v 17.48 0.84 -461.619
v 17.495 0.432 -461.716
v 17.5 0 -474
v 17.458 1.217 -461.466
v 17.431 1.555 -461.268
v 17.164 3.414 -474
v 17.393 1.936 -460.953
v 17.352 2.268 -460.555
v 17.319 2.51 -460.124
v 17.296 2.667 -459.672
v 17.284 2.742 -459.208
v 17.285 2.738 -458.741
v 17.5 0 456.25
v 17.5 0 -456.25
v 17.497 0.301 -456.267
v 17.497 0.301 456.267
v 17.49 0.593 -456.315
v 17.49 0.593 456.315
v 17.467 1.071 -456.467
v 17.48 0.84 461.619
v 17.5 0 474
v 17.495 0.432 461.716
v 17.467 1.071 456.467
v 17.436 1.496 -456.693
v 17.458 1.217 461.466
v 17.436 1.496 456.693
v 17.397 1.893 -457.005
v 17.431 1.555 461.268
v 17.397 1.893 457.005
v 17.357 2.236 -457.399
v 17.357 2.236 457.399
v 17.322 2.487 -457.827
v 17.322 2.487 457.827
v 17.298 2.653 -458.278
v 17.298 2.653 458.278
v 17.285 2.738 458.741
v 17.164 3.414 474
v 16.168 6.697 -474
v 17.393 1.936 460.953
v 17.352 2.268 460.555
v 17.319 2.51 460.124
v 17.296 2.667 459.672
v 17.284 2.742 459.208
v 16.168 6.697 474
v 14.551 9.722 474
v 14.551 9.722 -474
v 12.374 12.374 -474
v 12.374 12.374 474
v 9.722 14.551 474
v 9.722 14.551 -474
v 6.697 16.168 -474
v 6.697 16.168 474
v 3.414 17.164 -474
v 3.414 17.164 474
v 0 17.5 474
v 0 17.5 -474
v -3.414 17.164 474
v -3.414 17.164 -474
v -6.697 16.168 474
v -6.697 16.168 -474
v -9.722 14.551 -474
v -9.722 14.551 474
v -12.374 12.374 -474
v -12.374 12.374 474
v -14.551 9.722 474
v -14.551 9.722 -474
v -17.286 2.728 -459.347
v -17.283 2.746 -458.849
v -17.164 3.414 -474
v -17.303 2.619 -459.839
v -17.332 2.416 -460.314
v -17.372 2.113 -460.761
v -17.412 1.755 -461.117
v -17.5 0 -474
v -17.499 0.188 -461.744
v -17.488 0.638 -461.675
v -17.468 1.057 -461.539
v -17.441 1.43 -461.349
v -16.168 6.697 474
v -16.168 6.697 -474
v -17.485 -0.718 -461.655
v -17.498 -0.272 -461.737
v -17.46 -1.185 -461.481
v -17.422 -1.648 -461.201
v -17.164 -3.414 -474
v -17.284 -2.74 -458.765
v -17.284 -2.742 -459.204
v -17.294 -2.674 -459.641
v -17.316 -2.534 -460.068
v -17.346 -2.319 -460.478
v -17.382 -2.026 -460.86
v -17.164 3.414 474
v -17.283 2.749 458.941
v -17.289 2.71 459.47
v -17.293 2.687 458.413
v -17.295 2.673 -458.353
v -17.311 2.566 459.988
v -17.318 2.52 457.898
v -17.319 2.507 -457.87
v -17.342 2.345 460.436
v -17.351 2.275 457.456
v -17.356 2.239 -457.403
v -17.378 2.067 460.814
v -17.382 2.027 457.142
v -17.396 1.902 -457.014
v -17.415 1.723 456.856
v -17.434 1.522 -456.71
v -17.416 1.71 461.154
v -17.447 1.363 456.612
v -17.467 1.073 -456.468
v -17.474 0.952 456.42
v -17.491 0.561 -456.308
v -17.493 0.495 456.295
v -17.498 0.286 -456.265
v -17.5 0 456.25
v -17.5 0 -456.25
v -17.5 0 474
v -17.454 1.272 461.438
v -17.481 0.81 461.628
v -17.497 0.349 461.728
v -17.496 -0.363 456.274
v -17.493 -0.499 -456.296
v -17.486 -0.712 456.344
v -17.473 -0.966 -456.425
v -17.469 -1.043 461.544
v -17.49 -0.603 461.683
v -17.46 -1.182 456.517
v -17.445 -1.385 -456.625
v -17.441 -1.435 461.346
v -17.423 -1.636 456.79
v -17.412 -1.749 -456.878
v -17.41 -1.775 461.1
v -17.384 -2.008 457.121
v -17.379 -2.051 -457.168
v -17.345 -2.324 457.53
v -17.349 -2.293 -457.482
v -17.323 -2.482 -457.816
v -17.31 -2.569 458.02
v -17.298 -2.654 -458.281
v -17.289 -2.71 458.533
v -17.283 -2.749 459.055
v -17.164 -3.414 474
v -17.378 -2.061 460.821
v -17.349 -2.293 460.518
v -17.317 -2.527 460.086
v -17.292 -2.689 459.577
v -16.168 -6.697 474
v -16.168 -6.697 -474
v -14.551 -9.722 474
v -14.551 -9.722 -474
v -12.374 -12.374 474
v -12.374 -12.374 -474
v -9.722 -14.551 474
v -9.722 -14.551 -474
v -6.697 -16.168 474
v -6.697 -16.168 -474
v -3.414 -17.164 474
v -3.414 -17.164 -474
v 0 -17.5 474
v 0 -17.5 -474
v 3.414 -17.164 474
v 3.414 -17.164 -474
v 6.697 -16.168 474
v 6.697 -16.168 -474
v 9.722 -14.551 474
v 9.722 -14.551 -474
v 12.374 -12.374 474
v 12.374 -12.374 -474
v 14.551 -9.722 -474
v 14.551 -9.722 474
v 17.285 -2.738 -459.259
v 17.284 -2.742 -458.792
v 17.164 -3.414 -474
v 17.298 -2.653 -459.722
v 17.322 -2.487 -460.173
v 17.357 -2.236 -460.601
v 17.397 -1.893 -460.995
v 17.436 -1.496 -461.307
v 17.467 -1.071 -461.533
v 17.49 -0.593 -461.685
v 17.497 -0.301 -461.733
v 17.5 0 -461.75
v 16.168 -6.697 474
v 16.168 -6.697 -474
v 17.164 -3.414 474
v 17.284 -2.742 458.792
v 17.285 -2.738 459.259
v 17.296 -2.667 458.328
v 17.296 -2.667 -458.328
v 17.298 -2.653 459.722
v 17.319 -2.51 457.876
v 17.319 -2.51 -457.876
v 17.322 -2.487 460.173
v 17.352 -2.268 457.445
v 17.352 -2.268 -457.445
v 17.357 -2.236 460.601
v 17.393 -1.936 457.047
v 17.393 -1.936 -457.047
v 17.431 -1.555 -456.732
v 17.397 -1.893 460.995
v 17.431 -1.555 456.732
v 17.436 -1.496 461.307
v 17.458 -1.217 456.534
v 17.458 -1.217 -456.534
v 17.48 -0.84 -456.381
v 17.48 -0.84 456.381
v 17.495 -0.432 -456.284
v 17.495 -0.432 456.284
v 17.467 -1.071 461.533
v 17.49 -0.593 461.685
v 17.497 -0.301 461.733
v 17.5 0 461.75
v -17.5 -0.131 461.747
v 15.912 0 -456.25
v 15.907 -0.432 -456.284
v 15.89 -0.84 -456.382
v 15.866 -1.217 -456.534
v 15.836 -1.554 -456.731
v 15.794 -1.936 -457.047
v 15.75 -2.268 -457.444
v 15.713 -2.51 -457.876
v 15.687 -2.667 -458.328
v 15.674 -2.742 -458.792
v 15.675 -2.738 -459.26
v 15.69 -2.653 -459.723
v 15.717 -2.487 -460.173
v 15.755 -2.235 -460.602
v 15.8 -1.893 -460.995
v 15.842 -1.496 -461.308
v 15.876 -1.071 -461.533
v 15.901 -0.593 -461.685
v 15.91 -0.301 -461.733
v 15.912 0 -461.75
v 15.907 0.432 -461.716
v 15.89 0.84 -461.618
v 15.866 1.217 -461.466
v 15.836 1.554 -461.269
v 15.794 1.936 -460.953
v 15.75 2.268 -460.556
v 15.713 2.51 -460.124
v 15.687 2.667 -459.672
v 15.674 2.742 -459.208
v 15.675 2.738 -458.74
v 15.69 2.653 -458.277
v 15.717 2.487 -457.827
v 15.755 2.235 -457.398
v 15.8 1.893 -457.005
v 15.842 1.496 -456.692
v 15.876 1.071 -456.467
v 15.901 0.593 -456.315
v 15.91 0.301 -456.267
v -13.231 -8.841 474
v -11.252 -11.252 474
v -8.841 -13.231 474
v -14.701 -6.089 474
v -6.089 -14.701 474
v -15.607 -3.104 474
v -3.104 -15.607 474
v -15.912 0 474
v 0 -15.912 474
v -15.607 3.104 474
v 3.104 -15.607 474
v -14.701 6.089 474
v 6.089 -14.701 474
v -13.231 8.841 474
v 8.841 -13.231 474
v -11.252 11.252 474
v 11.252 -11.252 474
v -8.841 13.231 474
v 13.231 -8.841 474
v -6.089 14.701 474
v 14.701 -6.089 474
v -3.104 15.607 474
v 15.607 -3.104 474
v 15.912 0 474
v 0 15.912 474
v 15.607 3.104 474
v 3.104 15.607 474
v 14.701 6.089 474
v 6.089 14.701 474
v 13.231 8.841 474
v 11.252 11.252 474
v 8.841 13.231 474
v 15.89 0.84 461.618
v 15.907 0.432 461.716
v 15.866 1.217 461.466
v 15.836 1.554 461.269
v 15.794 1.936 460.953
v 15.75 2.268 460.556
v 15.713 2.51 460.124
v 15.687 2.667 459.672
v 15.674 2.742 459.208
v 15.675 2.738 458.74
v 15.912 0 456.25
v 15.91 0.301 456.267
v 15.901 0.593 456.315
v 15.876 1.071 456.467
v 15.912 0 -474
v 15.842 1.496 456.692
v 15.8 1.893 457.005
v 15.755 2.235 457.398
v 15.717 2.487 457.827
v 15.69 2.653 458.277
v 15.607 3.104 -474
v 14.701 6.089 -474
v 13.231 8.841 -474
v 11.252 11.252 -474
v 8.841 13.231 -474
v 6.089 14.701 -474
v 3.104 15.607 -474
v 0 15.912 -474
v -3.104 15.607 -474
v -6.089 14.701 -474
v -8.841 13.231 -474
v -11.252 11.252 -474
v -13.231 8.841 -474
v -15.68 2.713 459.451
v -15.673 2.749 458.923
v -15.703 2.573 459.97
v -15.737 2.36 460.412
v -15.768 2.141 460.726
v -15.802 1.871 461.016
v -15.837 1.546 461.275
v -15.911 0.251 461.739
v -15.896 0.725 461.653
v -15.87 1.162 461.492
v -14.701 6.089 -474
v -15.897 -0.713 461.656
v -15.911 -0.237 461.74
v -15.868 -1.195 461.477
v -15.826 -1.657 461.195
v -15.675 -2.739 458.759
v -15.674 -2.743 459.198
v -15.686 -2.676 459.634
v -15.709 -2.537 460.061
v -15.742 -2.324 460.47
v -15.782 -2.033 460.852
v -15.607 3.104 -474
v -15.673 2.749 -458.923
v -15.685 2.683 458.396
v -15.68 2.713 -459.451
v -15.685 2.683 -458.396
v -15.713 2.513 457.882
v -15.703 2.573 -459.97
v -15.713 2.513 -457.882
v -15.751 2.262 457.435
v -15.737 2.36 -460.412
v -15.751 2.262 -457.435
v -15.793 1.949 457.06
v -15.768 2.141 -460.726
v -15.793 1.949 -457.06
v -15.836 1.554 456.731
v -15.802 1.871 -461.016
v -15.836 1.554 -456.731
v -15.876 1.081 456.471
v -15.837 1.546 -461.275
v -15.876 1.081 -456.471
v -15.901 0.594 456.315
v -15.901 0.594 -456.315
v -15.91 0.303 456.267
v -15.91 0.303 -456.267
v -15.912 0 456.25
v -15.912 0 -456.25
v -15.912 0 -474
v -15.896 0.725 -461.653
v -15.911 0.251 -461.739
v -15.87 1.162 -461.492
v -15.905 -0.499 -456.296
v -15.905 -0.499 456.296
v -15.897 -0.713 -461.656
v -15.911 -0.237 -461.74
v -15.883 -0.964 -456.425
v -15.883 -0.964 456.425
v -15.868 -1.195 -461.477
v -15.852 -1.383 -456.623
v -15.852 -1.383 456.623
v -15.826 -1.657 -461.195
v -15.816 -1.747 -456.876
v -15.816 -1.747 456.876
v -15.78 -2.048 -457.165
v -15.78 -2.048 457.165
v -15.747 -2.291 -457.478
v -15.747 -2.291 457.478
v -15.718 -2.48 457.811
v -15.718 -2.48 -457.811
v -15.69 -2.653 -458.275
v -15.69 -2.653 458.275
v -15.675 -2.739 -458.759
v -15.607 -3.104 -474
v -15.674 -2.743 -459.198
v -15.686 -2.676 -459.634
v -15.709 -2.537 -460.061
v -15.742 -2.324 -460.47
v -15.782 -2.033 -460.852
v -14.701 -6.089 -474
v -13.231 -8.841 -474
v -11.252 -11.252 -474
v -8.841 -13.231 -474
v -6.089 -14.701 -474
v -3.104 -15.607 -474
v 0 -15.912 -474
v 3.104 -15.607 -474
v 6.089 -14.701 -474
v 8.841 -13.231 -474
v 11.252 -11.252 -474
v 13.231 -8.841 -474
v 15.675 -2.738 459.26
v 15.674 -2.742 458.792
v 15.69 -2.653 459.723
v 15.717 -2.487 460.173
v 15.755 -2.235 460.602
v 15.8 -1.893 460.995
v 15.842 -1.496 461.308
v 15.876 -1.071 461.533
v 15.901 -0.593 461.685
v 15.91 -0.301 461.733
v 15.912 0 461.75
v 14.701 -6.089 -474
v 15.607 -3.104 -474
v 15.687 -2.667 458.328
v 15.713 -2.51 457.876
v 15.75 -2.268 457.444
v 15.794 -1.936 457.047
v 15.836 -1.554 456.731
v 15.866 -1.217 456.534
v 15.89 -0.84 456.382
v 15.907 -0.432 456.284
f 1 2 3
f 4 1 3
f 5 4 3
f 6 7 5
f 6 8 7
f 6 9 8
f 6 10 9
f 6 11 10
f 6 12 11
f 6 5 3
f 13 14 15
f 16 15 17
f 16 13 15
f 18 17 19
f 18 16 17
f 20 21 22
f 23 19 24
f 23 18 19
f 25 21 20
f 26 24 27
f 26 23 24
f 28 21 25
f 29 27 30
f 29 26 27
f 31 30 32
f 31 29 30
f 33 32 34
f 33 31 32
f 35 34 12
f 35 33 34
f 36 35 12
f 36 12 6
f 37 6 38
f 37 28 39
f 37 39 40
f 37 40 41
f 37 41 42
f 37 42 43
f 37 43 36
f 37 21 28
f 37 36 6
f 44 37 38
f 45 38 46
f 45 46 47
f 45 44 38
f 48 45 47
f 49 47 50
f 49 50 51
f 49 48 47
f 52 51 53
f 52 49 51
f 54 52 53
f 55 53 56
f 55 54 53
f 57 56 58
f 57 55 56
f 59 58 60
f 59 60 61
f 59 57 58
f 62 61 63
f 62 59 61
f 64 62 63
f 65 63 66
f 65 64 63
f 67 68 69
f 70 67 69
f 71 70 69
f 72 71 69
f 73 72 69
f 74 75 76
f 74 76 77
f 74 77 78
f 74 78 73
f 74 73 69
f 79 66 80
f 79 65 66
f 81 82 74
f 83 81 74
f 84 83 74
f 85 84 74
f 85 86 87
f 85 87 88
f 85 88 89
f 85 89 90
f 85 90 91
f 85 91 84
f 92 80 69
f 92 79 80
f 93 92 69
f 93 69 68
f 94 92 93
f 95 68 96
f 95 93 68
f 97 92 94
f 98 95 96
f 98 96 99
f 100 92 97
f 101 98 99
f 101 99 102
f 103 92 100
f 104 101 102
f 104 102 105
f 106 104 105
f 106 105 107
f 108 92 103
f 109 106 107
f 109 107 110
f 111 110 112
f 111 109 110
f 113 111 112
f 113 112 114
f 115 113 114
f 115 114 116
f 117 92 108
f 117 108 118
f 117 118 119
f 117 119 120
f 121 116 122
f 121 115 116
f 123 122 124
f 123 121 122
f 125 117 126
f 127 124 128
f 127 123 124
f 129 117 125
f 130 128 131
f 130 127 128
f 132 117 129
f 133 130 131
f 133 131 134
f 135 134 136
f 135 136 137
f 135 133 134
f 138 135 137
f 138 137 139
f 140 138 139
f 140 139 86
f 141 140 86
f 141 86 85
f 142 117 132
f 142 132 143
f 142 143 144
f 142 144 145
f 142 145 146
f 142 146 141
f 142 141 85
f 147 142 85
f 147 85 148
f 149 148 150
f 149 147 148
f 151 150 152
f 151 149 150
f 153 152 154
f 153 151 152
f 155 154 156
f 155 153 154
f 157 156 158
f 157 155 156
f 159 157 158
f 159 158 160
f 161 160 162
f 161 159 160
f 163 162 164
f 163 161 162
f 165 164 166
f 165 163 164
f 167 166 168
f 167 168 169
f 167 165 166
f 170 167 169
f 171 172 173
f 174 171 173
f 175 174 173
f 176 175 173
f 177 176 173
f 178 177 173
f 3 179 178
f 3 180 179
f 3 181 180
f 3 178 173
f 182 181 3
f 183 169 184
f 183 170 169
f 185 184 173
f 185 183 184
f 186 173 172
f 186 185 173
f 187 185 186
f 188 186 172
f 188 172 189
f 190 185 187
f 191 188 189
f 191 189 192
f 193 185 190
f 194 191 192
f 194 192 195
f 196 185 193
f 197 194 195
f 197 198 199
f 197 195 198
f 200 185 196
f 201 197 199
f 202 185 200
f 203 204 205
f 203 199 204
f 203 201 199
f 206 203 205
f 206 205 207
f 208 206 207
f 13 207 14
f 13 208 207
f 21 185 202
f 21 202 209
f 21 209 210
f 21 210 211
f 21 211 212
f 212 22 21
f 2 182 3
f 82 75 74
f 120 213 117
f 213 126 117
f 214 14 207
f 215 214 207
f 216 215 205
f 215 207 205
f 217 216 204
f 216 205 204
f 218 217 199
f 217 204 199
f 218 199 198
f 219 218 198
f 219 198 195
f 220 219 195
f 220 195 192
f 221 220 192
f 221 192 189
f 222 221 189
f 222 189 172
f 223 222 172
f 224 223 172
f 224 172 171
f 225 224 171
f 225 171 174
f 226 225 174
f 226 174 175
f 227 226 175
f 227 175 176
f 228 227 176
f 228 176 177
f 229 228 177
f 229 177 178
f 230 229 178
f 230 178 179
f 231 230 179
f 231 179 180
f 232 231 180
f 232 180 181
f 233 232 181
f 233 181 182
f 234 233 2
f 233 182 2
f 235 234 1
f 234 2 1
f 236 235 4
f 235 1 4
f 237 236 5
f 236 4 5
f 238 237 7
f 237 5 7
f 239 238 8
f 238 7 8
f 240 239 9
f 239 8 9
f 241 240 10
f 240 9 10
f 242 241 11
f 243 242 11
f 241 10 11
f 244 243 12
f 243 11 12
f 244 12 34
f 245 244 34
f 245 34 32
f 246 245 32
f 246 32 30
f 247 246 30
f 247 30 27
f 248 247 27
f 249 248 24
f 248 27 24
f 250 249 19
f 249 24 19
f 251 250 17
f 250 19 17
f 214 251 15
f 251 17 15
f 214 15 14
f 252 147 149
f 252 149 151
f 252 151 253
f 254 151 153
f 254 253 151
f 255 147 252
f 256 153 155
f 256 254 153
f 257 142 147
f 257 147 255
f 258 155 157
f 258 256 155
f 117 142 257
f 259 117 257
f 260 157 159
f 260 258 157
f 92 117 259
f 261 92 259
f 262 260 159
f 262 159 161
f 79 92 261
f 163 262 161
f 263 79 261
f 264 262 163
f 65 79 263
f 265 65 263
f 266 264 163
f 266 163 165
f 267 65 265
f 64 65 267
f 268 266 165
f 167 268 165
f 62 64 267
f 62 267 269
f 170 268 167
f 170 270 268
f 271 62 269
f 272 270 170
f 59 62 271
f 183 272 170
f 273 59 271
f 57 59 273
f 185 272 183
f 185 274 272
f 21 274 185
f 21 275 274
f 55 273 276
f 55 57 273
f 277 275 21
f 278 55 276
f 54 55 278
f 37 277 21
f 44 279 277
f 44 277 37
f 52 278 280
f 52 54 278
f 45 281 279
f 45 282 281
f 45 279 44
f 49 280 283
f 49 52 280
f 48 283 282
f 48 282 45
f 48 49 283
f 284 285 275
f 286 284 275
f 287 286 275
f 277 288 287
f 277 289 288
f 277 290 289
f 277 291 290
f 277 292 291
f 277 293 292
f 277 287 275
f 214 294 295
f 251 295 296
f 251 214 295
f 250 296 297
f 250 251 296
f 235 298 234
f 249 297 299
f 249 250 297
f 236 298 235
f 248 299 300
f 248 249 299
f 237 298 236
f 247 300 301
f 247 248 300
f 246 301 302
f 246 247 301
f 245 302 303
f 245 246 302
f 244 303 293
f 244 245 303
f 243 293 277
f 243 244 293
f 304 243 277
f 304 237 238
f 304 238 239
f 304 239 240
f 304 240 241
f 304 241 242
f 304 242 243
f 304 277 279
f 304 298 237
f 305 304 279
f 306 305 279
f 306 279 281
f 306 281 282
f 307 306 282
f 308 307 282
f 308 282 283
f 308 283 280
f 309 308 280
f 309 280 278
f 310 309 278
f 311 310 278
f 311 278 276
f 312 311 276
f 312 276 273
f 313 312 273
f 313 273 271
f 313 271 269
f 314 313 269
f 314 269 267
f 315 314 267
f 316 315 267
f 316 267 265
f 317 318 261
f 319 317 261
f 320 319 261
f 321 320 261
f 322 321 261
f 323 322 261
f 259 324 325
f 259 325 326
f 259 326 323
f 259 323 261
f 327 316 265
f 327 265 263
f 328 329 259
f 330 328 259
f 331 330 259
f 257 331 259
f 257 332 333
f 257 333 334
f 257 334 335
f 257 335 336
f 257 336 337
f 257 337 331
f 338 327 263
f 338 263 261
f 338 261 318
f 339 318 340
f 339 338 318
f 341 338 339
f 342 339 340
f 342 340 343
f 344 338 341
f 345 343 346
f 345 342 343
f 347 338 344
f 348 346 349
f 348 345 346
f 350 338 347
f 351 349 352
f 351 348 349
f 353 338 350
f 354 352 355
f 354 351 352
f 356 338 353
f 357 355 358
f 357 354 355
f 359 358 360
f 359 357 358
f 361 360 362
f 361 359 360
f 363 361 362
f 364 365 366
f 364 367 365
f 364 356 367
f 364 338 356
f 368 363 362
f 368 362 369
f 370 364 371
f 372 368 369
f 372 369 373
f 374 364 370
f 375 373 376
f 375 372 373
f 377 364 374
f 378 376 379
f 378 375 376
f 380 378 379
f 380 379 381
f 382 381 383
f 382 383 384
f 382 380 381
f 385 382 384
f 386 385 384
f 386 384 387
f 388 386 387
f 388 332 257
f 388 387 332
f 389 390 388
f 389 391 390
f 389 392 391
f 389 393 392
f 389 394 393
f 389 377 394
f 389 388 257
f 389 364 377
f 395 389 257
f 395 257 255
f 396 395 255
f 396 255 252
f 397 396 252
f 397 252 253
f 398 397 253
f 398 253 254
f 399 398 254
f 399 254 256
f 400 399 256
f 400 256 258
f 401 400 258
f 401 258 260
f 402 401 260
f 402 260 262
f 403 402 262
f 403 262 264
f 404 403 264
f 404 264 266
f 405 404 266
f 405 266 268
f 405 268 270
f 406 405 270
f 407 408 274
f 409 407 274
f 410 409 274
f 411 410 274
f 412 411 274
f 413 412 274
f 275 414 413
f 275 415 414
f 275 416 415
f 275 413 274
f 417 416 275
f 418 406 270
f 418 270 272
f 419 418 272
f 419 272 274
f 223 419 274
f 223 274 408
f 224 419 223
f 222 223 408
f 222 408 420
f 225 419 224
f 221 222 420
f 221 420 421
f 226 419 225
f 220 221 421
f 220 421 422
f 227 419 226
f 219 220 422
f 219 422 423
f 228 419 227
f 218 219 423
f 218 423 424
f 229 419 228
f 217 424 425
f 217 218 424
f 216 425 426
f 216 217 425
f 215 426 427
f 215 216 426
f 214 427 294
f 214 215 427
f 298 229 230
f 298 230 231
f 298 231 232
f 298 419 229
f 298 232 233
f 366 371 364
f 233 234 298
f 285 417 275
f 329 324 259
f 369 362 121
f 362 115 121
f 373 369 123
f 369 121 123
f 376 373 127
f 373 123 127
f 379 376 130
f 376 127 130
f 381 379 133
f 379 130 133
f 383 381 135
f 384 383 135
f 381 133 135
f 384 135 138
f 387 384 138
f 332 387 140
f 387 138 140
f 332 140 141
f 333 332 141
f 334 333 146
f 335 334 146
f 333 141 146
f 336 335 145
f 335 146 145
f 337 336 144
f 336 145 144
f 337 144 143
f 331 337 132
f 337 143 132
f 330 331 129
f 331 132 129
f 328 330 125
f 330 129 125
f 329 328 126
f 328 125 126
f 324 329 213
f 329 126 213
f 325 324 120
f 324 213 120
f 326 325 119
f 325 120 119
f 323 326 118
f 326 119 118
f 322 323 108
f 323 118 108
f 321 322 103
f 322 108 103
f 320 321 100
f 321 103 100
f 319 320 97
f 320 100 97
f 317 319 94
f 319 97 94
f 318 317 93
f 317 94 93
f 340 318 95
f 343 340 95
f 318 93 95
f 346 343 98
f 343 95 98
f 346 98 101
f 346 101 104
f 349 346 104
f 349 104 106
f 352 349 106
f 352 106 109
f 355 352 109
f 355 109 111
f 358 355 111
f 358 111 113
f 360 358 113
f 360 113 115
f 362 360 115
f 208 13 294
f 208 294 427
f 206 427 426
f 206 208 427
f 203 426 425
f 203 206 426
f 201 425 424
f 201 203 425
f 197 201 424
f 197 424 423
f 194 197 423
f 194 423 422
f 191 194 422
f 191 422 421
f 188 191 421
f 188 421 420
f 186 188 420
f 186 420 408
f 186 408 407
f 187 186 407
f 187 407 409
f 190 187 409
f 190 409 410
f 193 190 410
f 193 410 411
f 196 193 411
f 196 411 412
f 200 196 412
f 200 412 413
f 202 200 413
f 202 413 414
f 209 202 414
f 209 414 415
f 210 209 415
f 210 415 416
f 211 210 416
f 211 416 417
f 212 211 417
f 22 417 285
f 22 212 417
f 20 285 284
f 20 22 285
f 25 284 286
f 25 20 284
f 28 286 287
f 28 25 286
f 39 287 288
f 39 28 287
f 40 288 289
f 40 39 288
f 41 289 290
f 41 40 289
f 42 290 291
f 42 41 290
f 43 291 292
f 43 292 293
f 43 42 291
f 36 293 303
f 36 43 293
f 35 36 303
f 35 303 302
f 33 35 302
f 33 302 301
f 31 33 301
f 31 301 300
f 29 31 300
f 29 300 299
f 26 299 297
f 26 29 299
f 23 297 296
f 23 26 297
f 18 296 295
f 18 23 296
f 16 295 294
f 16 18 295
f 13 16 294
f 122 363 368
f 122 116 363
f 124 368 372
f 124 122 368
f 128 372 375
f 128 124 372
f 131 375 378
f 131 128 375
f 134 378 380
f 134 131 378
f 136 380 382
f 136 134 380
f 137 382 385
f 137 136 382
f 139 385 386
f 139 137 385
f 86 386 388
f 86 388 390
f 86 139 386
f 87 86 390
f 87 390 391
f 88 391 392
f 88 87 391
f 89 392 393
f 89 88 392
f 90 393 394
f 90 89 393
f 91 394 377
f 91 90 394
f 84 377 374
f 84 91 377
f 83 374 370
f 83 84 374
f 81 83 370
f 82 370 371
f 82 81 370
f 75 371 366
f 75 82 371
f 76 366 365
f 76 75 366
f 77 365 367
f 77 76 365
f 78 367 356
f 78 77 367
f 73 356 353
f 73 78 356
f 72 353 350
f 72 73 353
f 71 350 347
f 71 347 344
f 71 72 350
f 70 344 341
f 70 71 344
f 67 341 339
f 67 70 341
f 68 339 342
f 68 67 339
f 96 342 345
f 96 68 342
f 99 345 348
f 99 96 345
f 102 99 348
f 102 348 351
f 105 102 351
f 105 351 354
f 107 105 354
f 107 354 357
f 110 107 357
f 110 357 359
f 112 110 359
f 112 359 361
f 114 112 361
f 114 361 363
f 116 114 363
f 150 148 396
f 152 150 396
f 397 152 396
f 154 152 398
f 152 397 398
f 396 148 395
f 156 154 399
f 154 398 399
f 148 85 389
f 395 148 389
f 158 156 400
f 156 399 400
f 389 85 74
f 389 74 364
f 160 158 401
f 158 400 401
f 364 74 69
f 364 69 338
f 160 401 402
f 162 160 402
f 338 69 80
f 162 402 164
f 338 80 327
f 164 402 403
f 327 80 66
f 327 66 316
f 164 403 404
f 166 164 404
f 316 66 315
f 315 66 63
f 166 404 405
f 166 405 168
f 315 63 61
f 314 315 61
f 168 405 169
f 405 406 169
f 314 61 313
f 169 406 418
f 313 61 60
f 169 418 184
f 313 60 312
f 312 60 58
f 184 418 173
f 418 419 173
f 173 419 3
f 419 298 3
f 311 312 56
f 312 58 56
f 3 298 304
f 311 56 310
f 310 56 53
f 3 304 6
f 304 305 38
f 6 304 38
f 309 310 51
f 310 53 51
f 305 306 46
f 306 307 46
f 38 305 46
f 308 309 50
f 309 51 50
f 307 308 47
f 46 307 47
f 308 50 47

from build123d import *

# Parameters (mm, degrees)
SKETCH2_R                                  = 17.5
SKETCH2_R_2                                = 15.9125
BOSS_EXTRUDE1_DEPTH                        = 474
SKETCH5_W                                  = 2.75
SKETCH5_H                                  = 17.5
MIRROR1_AT_THE_SECOND_PLANE_COPY_1_SKETC_W = 2.75
MIRROR1_AT_THE_SECOND_PLANE_COPY_1_SKETC_H = 17.5


with BuildPart() as part:
    # Sketch2 → Boss-Extrude1 (new body, symmetric)
    with BuildSketch(Plane.XY):
        Circle(SKETCH2_R)
        Circle(SKETCH2_R_2, mode=Mode.SUBTRACT)
    extrude(amount=BOSS_EXTRUDE1_DEPTH, both=True)

    # Sketch5 → M5 Clearance Hole1 (revolve, cut)
    with BuildSketch(Plane(origin=(0, 0, -459), x_dir=(0, 0, 1), z_dir=(0, 1, 0))):
        with Locations((1.375, 8.75)):
            Rectangle(SKETCH5_W, SKETCH5_H)
    m5_clearance_hole1 = revolve(axis=Axis((-6.35, 0, -459), (1, 0, 0)), mode=Mode.SUBTRACT)

    # Mirror1: M5 Clearance Hole1 across plane
    add(m5_clearance_hole1.mirror(Plane.XY), mode=Mode.SUBTRACT)

    # Mirror1 at the second plane: M5 Clearance Hole1 across plane
    add(m5_clearance_hole1.mirror(Plane(origin=(0, 0, 0), x_dir=(0, 0, 1), z_dir=(1, 0, 0))), mode=Mode.SUBTRACT)

    # Mirror1 at the second plane copy 1 sketc → Mirror1 at the second plane copy 1 (revolve, cut)
    with BuildSketch(Plane(origin=(0, 0, 459), x_dir=(0, 0, -1), z_dir=(0, 1, 0))):
        with Locations((1.375, 8.75)):
            Rectangle(MIRROR1_AT_THE_SECOND_PLANE_COPY_1_SKETC_W, MIRROR1_AT_THE_SECOND_PLANE_COPY_1_SKETC_H)
    revolve(axis=Axis((6.35, 0, 459), (-1, 0, 0)), mode=Mode.SUBTRACT)


solid = part.part
